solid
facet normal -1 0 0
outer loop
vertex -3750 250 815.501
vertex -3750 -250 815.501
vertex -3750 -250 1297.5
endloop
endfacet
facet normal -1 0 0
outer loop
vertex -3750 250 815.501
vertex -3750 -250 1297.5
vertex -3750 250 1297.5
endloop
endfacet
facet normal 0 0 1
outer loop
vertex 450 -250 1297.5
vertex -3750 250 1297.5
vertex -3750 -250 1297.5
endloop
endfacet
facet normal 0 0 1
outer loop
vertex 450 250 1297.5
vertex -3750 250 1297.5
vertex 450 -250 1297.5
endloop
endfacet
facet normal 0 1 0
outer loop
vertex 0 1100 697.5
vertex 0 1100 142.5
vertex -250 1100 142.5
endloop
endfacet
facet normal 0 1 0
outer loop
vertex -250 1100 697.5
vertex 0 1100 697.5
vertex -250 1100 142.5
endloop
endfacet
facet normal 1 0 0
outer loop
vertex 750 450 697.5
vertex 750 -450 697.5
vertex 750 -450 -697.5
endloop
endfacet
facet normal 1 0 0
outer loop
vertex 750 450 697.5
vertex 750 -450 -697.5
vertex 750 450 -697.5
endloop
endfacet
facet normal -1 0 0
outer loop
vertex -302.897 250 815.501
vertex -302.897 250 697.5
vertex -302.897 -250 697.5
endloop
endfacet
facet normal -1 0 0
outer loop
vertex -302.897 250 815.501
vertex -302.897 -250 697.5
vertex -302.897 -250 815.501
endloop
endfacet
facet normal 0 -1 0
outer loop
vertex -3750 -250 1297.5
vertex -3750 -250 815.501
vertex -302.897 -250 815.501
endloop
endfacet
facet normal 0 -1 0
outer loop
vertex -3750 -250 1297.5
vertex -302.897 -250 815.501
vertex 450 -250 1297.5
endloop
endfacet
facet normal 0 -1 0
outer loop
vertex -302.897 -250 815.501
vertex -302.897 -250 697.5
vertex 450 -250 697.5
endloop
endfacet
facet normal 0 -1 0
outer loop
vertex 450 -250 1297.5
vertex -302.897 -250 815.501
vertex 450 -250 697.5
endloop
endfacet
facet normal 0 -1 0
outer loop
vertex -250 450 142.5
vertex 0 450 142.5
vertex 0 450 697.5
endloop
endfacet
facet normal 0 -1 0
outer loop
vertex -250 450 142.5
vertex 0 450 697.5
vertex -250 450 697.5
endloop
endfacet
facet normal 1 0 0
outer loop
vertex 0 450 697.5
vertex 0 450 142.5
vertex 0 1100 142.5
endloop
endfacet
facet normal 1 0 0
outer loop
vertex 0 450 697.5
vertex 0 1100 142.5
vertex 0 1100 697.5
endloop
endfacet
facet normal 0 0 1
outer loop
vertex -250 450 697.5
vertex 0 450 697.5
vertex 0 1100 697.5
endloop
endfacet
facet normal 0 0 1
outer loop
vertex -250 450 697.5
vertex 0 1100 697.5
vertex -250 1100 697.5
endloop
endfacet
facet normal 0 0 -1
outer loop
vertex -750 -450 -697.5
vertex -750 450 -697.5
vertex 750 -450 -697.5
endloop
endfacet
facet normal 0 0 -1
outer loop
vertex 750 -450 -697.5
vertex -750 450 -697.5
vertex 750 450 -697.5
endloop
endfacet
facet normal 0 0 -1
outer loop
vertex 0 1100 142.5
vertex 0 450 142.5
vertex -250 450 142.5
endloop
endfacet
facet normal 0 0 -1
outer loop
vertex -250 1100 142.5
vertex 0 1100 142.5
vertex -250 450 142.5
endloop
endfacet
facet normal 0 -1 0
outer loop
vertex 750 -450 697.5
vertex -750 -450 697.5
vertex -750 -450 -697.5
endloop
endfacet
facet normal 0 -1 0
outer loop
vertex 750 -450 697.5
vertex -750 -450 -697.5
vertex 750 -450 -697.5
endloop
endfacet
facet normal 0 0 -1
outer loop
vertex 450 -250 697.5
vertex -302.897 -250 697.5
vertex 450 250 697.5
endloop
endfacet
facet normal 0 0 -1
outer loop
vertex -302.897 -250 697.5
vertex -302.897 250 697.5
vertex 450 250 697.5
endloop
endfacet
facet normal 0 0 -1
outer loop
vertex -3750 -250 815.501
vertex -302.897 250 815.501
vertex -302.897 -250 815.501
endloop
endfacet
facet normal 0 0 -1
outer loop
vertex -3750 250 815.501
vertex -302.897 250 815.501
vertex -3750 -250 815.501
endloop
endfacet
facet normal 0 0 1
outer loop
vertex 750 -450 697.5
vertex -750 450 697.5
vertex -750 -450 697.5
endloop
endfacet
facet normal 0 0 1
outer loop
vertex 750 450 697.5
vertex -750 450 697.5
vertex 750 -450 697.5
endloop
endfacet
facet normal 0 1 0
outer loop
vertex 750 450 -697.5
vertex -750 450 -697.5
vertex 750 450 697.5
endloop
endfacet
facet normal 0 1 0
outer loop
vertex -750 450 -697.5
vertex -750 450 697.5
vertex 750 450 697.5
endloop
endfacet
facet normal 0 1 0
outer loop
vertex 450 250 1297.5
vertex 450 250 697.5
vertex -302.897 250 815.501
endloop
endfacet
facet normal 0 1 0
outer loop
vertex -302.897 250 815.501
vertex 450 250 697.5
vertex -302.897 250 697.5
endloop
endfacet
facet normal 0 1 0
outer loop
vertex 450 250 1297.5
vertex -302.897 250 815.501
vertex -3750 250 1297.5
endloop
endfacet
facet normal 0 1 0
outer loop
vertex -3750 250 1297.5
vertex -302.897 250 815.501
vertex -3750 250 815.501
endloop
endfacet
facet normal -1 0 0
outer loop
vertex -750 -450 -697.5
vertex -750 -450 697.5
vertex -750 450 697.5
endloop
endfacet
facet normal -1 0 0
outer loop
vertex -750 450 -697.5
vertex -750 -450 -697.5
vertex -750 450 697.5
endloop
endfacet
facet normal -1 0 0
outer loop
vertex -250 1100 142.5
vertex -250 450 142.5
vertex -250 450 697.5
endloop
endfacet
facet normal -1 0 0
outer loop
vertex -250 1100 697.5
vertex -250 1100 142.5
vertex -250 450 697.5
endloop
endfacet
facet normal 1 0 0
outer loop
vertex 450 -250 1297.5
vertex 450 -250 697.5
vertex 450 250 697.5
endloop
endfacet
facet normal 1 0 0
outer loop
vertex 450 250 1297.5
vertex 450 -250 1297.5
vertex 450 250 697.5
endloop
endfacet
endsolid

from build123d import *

# Parameters (mm, degrees)
F0_W     = 1500
F0_H     = 900
F1_DEPTH = 697.5
F2_W     = 250
F2_H     = 555
F3_DEPTH = 650
F4_W     = 1200
F4_H     = 500
F4_W_2   = 3000
F5_DEPTH = 600
F6_W     = 3447.103292
F6_H     = 118.000617
F7_DEPTH = 700


with BuildPart() as f1:
    # F0 (on Top) → F1 (new body, symmetric)
    with BuildSketch(Plane.XY):
        Rectangle(F0_W, F0_H)
    extrude(amount=F1_DEPTH, both=True)


with BuildPart() as f3:
    # F2 (on face) → F3 (new body)
    with BuildSketch(Plane(origin=(0, 450, 0), x_dir=(-1, 0, 0), z_dir=(0, 1, 0))):
        with Locations((125, 420)):
            Rectangle(F2_W, F2_H)
    extrude(amount=F3_DEPTH)


with BuildPart() as f5:
    # F4 (on face) → F5 (new body)
    with BuildSketch(Plane.XY.offset(697.5)):
        with Locations((-150, 0)):
            Rectangle(F4_W, F4_H)
        with Locations((-2250, 0)):
            Rectangle(F4_W_2, F4_H)
    extrude(amount=F5_DEPTH)

    # F6 (on face) → F7 (cut)
    with BuildSketch(Plane(origin=(0, 250, 0), x_dir=(-1, 0, 0), z_dir=(0, 1, 0))):
        with Locations((2026.448354, 756.500308)):
            Rectangle(F6_W, F6_H)
    extrude(amount=-F7_DEPTH, mode=Mode.SUBTRACT)


solid = Compound([f1.part, f3.part, f5.part])
